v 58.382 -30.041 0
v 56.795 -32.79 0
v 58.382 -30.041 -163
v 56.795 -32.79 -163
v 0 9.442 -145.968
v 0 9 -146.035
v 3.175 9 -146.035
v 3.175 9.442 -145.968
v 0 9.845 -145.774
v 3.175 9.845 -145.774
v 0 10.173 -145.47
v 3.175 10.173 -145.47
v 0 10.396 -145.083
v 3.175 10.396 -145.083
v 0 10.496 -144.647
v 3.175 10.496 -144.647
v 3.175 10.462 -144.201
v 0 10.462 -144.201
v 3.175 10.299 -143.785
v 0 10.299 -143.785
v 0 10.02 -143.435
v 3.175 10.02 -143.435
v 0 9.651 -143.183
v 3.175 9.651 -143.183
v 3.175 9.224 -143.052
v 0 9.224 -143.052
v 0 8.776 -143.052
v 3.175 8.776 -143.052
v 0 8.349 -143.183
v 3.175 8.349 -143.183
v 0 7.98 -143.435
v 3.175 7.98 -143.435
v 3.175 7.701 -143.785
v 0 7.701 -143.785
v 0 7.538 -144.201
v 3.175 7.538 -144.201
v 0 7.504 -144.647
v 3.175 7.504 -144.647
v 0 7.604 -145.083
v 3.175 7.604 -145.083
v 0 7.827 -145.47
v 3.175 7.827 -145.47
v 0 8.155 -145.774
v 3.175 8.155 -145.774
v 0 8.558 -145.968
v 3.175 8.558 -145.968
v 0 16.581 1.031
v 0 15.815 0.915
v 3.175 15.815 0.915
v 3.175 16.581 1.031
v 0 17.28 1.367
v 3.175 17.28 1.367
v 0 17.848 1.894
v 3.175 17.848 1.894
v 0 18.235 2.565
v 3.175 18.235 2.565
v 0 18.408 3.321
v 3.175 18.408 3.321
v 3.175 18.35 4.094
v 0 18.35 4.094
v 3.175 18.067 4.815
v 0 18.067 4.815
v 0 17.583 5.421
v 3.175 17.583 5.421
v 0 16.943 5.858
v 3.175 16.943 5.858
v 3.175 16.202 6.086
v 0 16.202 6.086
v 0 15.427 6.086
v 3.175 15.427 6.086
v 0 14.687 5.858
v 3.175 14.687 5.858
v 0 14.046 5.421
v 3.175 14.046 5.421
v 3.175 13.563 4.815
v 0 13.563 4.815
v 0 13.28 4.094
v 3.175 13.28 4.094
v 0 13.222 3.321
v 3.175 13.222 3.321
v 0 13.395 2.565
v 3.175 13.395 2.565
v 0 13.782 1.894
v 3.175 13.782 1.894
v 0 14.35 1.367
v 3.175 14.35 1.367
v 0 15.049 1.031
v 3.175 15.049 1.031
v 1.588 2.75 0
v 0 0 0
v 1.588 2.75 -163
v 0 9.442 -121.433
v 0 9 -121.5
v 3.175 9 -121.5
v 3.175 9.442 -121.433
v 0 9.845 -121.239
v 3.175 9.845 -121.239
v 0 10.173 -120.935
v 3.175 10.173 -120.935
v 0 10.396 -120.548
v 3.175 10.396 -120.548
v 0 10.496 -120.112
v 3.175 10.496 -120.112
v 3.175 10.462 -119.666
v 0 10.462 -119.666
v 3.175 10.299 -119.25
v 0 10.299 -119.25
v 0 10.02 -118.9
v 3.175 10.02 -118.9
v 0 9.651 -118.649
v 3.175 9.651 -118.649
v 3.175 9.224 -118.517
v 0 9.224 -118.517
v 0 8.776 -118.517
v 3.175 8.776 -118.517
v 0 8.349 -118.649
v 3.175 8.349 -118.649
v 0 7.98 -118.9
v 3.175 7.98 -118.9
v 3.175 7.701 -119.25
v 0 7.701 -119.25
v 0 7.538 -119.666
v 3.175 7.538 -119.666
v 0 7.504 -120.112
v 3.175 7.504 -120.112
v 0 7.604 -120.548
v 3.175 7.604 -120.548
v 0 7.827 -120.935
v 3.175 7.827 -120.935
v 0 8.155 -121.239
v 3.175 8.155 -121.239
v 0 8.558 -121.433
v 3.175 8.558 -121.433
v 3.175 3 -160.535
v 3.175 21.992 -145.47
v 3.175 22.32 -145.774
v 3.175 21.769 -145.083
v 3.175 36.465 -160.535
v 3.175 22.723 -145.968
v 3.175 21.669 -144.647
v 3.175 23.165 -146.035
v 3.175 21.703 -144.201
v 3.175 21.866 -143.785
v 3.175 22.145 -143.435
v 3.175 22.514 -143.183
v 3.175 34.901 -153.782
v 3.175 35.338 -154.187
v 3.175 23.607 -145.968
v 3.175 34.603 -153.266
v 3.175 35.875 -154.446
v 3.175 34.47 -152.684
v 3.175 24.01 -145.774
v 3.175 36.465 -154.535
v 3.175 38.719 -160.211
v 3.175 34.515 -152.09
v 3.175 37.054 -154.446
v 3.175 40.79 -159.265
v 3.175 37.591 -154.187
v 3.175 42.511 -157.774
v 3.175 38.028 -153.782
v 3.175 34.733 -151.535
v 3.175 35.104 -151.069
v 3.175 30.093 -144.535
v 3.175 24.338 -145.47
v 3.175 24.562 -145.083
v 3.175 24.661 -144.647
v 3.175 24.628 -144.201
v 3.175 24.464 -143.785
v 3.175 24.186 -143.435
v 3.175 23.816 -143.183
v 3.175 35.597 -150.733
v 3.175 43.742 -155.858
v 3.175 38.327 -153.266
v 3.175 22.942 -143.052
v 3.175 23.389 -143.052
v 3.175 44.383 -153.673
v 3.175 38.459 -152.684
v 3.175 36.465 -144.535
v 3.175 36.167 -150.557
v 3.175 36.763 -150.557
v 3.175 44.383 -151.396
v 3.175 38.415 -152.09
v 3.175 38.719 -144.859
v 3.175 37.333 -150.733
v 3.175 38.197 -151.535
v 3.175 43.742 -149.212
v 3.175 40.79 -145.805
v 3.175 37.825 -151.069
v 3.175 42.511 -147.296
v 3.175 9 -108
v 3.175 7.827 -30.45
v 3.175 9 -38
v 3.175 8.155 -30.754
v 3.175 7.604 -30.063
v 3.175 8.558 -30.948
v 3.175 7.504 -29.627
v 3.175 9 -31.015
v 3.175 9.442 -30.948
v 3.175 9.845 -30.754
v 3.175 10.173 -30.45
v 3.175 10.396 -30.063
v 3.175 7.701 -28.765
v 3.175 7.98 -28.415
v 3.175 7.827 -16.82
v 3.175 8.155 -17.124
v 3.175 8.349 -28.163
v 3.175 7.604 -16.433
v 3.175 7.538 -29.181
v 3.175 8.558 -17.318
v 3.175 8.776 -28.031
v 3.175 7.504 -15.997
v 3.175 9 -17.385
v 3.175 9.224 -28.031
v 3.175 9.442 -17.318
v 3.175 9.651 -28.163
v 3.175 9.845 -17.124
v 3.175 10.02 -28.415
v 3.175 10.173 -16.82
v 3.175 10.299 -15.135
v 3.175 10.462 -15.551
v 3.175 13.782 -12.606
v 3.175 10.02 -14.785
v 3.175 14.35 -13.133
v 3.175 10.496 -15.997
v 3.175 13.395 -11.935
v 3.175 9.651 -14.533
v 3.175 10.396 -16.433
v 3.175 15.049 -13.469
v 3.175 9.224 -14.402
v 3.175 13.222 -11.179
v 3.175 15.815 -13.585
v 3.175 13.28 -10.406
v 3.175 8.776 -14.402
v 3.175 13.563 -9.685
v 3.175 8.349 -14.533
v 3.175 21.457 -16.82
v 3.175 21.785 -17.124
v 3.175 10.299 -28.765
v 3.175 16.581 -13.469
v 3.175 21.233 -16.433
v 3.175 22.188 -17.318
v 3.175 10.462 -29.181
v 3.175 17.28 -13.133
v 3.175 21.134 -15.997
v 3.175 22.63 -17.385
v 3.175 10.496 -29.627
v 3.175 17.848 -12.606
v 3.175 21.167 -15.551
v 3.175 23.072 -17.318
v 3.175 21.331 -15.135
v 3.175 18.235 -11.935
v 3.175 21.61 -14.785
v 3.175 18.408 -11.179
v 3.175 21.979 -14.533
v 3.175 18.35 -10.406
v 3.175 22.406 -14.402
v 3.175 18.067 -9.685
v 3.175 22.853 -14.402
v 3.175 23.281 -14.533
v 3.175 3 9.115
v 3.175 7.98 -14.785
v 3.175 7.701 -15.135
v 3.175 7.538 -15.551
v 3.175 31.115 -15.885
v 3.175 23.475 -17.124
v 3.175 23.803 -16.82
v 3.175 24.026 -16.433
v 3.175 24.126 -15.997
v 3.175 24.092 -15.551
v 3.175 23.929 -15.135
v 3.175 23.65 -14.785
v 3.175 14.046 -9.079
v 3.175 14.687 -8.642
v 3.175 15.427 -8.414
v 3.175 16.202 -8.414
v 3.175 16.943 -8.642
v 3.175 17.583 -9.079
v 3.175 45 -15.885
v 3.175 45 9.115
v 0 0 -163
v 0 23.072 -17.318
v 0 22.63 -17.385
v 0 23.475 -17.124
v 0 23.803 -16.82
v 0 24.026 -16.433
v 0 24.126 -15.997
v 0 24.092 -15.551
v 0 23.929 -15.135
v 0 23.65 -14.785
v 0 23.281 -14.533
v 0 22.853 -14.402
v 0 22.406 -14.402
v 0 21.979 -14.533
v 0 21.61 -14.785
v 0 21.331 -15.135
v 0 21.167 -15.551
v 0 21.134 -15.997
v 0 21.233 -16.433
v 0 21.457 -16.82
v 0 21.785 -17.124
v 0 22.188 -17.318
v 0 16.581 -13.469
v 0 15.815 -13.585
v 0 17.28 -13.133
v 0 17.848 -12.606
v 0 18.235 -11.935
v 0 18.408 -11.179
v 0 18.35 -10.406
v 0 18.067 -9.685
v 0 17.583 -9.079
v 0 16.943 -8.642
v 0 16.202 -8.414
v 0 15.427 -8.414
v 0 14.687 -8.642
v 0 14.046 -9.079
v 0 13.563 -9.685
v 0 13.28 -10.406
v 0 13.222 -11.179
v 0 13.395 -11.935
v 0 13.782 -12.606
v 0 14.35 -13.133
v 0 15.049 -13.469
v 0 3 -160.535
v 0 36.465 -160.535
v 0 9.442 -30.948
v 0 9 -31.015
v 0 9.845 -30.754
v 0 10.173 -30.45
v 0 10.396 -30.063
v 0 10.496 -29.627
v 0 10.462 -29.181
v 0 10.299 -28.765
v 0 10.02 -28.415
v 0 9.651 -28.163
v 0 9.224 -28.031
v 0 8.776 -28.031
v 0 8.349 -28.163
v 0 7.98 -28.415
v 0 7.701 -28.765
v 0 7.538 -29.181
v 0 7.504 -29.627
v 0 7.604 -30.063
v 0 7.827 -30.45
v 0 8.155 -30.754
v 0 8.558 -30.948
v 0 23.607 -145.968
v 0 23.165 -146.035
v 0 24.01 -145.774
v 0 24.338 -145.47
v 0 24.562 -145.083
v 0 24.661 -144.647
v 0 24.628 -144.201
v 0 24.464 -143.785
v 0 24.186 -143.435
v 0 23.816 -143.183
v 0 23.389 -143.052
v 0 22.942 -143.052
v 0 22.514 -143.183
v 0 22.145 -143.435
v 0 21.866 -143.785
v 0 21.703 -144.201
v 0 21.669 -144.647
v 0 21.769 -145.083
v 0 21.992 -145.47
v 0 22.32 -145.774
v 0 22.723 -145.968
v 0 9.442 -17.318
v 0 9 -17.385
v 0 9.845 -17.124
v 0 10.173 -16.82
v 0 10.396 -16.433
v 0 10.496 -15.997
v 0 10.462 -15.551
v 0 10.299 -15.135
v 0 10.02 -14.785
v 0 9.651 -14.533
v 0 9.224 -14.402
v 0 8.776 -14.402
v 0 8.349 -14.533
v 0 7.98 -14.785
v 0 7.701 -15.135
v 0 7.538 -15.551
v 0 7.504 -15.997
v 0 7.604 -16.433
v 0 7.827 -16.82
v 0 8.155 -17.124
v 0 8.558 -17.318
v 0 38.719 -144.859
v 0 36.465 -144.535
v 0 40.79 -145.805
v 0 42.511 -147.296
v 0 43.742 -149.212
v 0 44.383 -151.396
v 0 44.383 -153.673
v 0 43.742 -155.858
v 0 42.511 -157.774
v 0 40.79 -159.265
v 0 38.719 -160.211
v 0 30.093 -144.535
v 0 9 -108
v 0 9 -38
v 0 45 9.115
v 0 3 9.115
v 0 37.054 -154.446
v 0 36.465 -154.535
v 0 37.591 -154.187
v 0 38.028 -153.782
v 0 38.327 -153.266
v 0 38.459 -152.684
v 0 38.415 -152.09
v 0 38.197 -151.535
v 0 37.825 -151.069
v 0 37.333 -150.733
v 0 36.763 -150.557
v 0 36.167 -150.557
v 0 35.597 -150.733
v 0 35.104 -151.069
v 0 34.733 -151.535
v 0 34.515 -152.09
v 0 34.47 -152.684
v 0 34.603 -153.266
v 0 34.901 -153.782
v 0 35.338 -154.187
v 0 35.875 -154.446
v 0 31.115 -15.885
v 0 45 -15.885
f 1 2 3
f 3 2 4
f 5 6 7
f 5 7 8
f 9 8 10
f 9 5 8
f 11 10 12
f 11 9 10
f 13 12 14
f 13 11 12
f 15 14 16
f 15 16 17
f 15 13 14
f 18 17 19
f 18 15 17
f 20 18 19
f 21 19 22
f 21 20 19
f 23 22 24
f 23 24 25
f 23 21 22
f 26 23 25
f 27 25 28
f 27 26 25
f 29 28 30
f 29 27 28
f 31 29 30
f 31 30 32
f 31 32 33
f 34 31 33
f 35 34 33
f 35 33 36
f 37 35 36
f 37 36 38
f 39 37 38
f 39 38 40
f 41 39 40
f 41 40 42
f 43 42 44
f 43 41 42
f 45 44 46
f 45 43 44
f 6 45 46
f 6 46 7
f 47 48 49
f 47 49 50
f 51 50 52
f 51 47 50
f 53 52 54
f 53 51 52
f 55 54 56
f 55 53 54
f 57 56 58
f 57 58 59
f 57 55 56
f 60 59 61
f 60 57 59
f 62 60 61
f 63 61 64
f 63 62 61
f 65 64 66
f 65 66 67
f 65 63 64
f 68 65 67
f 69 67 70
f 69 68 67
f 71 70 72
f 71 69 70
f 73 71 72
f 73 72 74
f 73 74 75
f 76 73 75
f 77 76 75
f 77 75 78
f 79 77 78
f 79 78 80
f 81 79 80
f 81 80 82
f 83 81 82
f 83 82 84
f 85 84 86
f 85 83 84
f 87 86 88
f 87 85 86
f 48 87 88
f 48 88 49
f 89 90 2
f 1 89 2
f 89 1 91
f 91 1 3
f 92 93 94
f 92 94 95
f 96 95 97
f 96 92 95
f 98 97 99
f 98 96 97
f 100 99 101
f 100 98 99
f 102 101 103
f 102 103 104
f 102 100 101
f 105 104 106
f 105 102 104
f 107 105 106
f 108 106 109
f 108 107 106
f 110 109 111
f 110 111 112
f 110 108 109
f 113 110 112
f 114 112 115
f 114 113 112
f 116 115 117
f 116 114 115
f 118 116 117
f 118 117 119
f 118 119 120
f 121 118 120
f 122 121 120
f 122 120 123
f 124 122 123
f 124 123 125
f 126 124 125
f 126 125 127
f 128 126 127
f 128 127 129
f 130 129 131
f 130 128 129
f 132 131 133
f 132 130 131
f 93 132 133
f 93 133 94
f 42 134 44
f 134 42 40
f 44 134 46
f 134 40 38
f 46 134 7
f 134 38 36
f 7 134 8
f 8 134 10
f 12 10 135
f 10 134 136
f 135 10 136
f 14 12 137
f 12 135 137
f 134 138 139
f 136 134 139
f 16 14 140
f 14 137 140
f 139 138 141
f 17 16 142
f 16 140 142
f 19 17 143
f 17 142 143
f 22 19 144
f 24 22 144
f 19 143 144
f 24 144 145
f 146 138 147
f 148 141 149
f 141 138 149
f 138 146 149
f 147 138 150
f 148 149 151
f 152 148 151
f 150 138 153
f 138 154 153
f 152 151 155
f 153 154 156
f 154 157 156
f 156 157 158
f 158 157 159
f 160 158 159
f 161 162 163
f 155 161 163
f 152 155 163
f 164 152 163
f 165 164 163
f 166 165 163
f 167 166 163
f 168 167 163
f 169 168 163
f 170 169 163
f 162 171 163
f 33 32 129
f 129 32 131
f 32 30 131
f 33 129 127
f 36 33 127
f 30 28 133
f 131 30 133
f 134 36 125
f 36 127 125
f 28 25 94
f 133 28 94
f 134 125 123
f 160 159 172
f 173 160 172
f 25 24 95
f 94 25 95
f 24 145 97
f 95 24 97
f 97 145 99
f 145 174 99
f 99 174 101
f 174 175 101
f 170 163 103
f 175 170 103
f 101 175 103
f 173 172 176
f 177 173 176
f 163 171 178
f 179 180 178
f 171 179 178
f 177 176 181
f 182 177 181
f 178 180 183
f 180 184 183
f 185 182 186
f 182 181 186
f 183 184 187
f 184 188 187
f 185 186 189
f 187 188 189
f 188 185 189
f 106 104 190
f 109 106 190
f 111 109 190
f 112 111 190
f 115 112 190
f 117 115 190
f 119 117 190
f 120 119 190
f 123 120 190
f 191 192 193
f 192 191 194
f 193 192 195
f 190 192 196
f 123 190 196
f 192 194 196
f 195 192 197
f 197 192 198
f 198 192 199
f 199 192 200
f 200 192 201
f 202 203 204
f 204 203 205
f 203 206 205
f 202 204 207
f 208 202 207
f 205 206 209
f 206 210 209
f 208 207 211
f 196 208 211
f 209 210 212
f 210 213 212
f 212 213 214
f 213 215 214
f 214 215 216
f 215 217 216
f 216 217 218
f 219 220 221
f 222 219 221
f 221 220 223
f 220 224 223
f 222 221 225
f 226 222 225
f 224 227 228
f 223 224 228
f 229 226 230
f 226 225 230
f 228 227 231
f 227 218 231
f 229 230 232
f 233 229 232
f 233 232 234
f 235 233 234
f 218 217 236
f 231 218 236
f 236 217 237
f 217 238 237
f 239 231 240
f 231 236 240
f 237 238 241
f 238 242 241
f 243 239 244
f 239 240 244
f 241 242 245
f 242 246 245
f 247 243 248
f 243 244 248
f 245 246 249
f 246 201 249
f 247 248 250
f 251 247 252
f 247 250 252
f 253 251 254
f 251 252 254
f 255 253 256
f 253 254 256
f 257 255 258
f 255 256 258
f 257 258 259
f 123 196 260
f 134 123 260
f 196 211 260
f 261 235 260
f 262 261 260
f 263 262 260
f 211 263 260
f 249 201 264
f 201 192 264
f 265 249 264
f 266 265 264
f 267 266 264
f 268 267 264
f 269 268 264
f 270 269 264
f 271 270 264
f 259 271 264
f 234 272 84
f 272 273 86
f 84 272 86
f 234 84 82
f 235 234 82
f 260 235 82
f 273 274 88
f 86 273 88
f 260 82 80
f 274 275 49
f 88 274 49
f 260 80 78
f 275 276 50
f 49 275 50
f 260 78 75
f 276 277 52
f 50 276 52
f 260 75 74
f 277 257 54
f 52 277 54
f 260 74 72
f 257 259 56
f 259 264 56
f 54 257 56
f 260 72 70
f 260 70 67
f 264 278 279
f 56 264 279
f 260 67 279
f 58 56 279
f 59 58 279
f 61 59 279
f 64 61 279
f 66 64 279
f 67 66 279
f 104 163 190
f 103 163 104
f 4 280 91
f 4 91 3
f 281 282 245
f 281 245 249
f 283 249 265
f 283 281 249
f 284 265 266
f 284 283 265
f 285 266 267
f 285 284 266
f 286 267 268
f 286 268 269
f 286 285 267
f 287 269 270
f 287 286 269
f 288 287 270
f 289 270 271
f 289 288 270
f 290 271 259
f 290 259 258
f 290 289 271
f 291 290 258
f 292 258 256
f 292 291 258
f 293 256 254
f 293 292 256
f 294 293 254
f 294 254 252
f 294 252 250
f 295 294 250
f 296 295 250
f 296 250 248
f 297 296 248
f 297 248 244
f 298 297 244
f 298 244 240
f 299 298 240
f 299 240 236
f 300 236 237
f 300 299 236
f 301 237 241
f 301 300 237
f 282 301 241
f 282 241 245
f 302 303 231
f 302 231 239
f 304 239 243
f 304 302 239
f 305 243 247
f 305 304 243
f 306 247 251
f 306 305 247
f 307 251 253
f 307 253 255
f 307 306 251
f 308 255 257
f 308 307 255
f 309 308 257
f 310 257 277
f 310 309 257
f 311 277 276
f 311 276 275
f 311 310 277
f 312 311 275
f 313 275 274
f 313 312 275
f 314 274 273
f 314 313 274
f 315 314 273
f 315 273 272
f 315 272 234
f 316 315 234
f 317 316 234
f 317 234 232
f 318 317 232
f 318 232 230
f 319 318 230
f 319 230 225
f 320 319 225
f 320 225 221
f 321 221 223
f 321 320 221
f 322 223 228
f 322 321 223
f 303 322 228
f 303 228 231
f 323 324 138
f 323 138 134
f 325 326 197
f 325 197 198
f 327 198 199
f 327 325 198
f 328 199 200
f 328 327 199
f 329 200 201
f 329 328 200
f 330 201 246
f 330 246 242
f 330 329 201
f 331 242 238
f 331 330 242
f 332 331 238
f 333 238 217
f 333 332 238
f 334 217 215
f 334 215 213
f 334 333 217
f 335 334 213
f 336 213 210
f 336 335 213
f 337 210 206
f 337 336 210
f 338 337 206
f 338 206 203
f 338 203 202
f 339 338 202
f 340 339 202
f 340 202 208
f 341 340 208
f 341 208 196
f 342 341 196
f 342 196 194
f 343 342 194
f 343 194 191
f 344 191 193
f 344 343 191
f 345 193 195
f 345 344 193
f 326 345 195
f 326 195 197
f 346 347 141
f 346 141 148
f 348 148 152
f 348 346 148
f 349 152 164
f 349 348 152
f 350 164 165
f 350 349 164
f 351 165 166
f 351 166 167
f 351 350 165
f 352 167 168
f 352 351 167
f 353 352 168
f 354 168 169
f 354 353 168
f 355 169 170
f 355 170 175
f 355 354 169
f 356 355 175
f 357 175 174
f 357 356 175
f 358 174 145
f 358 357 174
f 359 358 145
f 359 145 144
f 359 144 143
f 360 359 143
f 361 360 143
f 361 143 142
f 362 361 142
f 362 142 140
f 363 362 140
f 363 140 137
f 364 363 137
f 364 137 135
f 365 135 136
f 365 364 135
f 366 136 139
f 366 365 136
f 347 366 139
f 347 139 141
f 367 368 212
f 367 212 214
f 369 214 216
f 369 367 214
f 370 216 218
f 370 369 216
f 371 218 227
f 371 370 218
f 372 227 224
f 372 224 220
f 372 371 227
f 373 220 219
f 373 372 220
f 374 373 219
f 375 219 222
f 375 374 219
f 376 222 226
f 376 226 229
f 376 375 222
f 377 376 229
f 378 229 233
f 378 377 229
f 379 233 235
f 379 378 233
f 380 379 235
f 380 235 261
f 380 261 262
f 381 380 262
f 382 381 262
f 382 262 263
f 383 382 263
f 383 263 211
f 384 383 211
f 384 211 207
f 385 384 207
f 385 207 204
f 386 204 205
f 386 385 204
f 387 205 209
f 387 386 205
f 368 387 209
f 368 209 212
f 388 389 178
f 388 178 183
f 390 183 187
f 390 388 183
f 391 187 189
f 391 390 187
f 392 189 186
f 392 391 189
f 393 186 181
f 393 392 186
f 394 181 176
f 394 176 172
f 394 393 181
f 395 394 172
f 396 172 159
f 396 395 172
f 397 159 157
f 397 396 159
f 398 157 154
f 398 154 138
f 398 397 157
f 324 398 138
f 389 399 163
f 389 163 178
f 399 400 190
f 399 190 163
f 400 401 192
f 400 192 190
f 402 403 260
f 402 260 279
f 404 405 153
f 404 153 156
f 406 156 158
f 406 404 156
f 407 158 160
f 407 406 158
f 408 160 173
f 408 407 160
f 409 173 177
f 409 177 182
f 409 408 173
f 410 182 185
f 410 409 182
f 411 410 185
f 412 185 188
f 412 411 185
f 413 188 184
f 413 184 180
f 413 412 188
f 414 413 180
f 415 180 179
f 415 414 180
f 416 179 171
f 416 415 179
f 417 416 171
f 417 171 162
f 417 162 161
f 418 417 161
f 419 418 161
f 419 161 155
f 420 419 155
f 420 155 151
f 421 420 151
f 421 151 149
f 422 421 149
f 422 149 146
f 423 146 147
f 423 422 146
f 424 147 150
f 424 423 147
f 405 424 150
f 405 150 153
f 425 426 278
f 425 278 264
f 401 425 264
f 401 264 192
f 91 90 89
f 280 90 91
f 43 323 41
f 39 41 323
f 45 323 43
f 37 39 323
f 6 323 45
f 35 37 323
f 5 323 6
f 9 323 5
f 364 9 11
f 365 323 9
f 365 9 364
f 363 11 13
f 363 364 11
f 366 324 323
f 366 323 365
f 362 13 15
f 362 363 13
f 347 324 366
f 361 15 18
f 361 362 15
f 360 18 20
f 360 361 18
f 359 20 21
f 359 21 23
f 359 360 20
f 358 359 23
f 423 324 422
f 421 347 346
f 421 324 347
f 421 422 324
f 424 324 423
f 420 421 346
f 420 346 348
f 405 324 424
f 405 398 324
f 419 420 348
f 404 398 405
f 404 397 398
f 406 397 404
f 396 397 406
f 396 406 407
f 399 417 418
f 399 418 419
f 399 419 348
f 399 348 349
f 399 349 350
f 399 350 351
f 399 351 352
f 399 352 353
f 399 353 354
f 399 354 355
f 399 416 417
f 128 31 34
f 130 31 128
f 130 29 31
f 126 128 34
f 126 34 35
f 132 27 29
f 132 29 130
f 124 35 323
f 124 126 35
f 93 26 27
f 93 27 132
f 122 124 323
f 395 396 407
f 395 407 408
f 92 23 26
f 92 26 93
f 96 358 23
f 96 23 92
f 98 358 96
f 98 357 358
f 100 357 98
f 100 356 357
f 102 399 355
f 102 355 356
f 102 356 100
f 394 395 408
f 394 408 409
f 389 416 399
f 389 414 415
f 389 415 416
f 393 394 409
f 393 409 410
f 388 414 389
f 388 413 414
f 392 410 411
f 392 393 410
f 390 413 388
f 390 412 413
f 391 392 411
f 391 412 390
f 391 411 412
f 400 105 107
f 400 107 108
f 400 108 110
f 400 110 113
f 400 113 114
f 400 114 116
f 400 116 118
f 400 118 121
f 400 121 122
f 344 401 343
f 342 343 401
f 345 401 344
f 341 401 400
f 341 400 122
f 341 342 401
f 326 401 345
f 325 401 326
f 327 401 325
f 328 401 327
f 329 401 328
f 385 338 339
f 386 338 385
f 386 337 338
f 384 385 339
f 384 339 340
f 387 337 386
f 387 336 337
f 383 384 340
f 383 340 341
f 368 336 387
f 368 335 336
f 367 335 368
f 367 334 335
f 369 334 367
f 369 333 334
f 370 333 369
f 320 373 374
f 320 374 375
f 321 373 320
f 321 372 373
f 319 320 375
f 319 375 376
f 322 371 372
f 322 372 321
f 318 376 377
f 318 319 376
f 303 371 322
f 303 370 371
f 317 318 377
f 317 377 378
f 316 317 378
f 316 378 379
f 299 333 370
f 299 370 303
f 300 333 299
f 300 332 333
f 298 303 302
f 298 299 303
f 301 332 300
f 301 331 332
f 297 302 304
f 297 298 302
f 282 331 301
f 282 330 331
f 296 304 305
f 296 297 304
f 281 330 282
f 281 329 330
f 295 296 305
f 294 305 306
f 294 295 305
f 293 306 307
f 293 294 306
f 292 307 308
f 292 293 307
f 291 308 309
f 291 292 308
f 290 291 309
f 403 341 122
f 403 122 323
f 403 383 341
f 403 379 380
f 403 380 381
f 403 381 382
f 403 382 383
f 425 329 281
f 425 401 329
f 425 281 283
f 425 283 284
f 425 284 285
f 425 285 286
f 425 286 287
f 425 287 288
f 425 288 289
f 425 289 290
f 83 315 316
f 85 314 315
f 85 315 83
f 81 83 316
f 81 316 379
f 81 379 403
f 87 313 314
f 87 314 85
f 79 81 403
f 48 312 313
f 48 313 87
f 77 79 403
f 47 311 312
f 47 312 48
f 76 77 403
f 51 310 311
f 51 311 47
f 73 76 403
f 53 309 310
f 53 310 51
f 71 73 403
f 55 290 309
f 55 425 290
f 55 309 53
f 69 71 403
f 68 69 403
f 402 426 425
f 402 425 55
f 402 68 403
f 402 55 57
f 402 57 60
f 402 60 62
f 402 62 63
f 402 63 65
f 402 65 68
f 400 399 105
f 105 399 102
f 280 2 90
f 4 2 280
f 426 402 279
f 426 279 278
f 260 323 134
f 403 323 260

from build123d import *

# Parameters (mm, degrees)
SKETCH11_W          = 163
SKETCH11_H          = 65.580816733
BOSS_EXTRUDE2_DEPTH = 3.175
SKETCH12_R          = 1.5
SKETCH12_R_2        = 2
SKETCH12_R_3        = 2.6
BOSS_EXTRUDE3_DEPTH = 3.175


with BuildPart() as part:
    # Sketch11 → Boss-Extrude2 (new body)
    with BuildSketch(Plane(origin=(0, 0, 0), x_dir=(0, 0, -1), z_dir=(-0.5, -0.866025404, 0))):
        with Locations((81.5, 32.790408367)):
            Rectangle(SKETCH11_W, SKETCH11_H)
    extrude(amount=-BOSS_EXTRUDE2_DEPTH)


with BuildPart() as body_2:
    # Sketch12 → Boss-Extrude3 (new body)
    with BuildSketch(Plane(origin=(0, 0, 0), x_dir=(0, 0, -1), z_dir=(1, 0, 0))):
        with BuildLine():
            Line((-9.115081699, 45), (15.884918301, 45))
            Line((15.884918301, 45), (15.884918301, 31.115081699))
            Line((15.884918301, 31.115081699), (38, 9))
            Line((38, 9), (108, 9))
            Line((108, 9), (144.534918301, 30.093444916))
            Line((144.534918301, 30.093444916), (144.534918301, 36.464807754))
            ThreePointArc((144.534918301, 36.464807754), (152.534918301, 44.464807754), (160.534918301, 36.464807754))
            Line((160.534918301, 36.464807754), (160.534918301, 3))
            Line((160.534918301, 3), (-9.115081699, 3))
            Line((-9.115081699, 3), (-9.115081699, 45))
        make_face()
        with Locations((15.884918301, 22.629800325)):
            Circle(SKETCH12_R, mode=Mode.SUBTRACT)
        with Locations((120, 9)):
            Circle(SKETCH12_R, mode=Mode.SUBTRACT)
        with Locations((144.534918301, 23.165241686)):
            Circle(SKETCH12_R, mode=Mode.SUBTRACT)
        with Locations((29.514718626, 9)):
            Circle(SKETCH12_R, mode=Mode.SUBTRACT)
        with Locations((15.884918301, 9)):
            Circle(SKETCH12_R, mode=Mode.SUBTRACT)
        with Locations((144.534918301, 9)):
            Circle(SKETCH12_R, mode=Mode.SUBTRACT)
        with Locations((152.534918301, 36.464807754)):
            Circle(SKETCH12_R_2, mode=Mode.SUBTRACT)
        with Locations((-3.515081699, 15.814900162)):
            Circle(SKETCH12_R_3, mode=Mode.SUBTRACT)
        with Locations((10.984918301, 15.814900162)):
            Circle(SKETCH12_R_3, mode=Mode.SUBTRACT)
    extrude(amount=BOSS_EXTRUDE3_DEPTH)


solid = Compound([part.part, body_2.part])
